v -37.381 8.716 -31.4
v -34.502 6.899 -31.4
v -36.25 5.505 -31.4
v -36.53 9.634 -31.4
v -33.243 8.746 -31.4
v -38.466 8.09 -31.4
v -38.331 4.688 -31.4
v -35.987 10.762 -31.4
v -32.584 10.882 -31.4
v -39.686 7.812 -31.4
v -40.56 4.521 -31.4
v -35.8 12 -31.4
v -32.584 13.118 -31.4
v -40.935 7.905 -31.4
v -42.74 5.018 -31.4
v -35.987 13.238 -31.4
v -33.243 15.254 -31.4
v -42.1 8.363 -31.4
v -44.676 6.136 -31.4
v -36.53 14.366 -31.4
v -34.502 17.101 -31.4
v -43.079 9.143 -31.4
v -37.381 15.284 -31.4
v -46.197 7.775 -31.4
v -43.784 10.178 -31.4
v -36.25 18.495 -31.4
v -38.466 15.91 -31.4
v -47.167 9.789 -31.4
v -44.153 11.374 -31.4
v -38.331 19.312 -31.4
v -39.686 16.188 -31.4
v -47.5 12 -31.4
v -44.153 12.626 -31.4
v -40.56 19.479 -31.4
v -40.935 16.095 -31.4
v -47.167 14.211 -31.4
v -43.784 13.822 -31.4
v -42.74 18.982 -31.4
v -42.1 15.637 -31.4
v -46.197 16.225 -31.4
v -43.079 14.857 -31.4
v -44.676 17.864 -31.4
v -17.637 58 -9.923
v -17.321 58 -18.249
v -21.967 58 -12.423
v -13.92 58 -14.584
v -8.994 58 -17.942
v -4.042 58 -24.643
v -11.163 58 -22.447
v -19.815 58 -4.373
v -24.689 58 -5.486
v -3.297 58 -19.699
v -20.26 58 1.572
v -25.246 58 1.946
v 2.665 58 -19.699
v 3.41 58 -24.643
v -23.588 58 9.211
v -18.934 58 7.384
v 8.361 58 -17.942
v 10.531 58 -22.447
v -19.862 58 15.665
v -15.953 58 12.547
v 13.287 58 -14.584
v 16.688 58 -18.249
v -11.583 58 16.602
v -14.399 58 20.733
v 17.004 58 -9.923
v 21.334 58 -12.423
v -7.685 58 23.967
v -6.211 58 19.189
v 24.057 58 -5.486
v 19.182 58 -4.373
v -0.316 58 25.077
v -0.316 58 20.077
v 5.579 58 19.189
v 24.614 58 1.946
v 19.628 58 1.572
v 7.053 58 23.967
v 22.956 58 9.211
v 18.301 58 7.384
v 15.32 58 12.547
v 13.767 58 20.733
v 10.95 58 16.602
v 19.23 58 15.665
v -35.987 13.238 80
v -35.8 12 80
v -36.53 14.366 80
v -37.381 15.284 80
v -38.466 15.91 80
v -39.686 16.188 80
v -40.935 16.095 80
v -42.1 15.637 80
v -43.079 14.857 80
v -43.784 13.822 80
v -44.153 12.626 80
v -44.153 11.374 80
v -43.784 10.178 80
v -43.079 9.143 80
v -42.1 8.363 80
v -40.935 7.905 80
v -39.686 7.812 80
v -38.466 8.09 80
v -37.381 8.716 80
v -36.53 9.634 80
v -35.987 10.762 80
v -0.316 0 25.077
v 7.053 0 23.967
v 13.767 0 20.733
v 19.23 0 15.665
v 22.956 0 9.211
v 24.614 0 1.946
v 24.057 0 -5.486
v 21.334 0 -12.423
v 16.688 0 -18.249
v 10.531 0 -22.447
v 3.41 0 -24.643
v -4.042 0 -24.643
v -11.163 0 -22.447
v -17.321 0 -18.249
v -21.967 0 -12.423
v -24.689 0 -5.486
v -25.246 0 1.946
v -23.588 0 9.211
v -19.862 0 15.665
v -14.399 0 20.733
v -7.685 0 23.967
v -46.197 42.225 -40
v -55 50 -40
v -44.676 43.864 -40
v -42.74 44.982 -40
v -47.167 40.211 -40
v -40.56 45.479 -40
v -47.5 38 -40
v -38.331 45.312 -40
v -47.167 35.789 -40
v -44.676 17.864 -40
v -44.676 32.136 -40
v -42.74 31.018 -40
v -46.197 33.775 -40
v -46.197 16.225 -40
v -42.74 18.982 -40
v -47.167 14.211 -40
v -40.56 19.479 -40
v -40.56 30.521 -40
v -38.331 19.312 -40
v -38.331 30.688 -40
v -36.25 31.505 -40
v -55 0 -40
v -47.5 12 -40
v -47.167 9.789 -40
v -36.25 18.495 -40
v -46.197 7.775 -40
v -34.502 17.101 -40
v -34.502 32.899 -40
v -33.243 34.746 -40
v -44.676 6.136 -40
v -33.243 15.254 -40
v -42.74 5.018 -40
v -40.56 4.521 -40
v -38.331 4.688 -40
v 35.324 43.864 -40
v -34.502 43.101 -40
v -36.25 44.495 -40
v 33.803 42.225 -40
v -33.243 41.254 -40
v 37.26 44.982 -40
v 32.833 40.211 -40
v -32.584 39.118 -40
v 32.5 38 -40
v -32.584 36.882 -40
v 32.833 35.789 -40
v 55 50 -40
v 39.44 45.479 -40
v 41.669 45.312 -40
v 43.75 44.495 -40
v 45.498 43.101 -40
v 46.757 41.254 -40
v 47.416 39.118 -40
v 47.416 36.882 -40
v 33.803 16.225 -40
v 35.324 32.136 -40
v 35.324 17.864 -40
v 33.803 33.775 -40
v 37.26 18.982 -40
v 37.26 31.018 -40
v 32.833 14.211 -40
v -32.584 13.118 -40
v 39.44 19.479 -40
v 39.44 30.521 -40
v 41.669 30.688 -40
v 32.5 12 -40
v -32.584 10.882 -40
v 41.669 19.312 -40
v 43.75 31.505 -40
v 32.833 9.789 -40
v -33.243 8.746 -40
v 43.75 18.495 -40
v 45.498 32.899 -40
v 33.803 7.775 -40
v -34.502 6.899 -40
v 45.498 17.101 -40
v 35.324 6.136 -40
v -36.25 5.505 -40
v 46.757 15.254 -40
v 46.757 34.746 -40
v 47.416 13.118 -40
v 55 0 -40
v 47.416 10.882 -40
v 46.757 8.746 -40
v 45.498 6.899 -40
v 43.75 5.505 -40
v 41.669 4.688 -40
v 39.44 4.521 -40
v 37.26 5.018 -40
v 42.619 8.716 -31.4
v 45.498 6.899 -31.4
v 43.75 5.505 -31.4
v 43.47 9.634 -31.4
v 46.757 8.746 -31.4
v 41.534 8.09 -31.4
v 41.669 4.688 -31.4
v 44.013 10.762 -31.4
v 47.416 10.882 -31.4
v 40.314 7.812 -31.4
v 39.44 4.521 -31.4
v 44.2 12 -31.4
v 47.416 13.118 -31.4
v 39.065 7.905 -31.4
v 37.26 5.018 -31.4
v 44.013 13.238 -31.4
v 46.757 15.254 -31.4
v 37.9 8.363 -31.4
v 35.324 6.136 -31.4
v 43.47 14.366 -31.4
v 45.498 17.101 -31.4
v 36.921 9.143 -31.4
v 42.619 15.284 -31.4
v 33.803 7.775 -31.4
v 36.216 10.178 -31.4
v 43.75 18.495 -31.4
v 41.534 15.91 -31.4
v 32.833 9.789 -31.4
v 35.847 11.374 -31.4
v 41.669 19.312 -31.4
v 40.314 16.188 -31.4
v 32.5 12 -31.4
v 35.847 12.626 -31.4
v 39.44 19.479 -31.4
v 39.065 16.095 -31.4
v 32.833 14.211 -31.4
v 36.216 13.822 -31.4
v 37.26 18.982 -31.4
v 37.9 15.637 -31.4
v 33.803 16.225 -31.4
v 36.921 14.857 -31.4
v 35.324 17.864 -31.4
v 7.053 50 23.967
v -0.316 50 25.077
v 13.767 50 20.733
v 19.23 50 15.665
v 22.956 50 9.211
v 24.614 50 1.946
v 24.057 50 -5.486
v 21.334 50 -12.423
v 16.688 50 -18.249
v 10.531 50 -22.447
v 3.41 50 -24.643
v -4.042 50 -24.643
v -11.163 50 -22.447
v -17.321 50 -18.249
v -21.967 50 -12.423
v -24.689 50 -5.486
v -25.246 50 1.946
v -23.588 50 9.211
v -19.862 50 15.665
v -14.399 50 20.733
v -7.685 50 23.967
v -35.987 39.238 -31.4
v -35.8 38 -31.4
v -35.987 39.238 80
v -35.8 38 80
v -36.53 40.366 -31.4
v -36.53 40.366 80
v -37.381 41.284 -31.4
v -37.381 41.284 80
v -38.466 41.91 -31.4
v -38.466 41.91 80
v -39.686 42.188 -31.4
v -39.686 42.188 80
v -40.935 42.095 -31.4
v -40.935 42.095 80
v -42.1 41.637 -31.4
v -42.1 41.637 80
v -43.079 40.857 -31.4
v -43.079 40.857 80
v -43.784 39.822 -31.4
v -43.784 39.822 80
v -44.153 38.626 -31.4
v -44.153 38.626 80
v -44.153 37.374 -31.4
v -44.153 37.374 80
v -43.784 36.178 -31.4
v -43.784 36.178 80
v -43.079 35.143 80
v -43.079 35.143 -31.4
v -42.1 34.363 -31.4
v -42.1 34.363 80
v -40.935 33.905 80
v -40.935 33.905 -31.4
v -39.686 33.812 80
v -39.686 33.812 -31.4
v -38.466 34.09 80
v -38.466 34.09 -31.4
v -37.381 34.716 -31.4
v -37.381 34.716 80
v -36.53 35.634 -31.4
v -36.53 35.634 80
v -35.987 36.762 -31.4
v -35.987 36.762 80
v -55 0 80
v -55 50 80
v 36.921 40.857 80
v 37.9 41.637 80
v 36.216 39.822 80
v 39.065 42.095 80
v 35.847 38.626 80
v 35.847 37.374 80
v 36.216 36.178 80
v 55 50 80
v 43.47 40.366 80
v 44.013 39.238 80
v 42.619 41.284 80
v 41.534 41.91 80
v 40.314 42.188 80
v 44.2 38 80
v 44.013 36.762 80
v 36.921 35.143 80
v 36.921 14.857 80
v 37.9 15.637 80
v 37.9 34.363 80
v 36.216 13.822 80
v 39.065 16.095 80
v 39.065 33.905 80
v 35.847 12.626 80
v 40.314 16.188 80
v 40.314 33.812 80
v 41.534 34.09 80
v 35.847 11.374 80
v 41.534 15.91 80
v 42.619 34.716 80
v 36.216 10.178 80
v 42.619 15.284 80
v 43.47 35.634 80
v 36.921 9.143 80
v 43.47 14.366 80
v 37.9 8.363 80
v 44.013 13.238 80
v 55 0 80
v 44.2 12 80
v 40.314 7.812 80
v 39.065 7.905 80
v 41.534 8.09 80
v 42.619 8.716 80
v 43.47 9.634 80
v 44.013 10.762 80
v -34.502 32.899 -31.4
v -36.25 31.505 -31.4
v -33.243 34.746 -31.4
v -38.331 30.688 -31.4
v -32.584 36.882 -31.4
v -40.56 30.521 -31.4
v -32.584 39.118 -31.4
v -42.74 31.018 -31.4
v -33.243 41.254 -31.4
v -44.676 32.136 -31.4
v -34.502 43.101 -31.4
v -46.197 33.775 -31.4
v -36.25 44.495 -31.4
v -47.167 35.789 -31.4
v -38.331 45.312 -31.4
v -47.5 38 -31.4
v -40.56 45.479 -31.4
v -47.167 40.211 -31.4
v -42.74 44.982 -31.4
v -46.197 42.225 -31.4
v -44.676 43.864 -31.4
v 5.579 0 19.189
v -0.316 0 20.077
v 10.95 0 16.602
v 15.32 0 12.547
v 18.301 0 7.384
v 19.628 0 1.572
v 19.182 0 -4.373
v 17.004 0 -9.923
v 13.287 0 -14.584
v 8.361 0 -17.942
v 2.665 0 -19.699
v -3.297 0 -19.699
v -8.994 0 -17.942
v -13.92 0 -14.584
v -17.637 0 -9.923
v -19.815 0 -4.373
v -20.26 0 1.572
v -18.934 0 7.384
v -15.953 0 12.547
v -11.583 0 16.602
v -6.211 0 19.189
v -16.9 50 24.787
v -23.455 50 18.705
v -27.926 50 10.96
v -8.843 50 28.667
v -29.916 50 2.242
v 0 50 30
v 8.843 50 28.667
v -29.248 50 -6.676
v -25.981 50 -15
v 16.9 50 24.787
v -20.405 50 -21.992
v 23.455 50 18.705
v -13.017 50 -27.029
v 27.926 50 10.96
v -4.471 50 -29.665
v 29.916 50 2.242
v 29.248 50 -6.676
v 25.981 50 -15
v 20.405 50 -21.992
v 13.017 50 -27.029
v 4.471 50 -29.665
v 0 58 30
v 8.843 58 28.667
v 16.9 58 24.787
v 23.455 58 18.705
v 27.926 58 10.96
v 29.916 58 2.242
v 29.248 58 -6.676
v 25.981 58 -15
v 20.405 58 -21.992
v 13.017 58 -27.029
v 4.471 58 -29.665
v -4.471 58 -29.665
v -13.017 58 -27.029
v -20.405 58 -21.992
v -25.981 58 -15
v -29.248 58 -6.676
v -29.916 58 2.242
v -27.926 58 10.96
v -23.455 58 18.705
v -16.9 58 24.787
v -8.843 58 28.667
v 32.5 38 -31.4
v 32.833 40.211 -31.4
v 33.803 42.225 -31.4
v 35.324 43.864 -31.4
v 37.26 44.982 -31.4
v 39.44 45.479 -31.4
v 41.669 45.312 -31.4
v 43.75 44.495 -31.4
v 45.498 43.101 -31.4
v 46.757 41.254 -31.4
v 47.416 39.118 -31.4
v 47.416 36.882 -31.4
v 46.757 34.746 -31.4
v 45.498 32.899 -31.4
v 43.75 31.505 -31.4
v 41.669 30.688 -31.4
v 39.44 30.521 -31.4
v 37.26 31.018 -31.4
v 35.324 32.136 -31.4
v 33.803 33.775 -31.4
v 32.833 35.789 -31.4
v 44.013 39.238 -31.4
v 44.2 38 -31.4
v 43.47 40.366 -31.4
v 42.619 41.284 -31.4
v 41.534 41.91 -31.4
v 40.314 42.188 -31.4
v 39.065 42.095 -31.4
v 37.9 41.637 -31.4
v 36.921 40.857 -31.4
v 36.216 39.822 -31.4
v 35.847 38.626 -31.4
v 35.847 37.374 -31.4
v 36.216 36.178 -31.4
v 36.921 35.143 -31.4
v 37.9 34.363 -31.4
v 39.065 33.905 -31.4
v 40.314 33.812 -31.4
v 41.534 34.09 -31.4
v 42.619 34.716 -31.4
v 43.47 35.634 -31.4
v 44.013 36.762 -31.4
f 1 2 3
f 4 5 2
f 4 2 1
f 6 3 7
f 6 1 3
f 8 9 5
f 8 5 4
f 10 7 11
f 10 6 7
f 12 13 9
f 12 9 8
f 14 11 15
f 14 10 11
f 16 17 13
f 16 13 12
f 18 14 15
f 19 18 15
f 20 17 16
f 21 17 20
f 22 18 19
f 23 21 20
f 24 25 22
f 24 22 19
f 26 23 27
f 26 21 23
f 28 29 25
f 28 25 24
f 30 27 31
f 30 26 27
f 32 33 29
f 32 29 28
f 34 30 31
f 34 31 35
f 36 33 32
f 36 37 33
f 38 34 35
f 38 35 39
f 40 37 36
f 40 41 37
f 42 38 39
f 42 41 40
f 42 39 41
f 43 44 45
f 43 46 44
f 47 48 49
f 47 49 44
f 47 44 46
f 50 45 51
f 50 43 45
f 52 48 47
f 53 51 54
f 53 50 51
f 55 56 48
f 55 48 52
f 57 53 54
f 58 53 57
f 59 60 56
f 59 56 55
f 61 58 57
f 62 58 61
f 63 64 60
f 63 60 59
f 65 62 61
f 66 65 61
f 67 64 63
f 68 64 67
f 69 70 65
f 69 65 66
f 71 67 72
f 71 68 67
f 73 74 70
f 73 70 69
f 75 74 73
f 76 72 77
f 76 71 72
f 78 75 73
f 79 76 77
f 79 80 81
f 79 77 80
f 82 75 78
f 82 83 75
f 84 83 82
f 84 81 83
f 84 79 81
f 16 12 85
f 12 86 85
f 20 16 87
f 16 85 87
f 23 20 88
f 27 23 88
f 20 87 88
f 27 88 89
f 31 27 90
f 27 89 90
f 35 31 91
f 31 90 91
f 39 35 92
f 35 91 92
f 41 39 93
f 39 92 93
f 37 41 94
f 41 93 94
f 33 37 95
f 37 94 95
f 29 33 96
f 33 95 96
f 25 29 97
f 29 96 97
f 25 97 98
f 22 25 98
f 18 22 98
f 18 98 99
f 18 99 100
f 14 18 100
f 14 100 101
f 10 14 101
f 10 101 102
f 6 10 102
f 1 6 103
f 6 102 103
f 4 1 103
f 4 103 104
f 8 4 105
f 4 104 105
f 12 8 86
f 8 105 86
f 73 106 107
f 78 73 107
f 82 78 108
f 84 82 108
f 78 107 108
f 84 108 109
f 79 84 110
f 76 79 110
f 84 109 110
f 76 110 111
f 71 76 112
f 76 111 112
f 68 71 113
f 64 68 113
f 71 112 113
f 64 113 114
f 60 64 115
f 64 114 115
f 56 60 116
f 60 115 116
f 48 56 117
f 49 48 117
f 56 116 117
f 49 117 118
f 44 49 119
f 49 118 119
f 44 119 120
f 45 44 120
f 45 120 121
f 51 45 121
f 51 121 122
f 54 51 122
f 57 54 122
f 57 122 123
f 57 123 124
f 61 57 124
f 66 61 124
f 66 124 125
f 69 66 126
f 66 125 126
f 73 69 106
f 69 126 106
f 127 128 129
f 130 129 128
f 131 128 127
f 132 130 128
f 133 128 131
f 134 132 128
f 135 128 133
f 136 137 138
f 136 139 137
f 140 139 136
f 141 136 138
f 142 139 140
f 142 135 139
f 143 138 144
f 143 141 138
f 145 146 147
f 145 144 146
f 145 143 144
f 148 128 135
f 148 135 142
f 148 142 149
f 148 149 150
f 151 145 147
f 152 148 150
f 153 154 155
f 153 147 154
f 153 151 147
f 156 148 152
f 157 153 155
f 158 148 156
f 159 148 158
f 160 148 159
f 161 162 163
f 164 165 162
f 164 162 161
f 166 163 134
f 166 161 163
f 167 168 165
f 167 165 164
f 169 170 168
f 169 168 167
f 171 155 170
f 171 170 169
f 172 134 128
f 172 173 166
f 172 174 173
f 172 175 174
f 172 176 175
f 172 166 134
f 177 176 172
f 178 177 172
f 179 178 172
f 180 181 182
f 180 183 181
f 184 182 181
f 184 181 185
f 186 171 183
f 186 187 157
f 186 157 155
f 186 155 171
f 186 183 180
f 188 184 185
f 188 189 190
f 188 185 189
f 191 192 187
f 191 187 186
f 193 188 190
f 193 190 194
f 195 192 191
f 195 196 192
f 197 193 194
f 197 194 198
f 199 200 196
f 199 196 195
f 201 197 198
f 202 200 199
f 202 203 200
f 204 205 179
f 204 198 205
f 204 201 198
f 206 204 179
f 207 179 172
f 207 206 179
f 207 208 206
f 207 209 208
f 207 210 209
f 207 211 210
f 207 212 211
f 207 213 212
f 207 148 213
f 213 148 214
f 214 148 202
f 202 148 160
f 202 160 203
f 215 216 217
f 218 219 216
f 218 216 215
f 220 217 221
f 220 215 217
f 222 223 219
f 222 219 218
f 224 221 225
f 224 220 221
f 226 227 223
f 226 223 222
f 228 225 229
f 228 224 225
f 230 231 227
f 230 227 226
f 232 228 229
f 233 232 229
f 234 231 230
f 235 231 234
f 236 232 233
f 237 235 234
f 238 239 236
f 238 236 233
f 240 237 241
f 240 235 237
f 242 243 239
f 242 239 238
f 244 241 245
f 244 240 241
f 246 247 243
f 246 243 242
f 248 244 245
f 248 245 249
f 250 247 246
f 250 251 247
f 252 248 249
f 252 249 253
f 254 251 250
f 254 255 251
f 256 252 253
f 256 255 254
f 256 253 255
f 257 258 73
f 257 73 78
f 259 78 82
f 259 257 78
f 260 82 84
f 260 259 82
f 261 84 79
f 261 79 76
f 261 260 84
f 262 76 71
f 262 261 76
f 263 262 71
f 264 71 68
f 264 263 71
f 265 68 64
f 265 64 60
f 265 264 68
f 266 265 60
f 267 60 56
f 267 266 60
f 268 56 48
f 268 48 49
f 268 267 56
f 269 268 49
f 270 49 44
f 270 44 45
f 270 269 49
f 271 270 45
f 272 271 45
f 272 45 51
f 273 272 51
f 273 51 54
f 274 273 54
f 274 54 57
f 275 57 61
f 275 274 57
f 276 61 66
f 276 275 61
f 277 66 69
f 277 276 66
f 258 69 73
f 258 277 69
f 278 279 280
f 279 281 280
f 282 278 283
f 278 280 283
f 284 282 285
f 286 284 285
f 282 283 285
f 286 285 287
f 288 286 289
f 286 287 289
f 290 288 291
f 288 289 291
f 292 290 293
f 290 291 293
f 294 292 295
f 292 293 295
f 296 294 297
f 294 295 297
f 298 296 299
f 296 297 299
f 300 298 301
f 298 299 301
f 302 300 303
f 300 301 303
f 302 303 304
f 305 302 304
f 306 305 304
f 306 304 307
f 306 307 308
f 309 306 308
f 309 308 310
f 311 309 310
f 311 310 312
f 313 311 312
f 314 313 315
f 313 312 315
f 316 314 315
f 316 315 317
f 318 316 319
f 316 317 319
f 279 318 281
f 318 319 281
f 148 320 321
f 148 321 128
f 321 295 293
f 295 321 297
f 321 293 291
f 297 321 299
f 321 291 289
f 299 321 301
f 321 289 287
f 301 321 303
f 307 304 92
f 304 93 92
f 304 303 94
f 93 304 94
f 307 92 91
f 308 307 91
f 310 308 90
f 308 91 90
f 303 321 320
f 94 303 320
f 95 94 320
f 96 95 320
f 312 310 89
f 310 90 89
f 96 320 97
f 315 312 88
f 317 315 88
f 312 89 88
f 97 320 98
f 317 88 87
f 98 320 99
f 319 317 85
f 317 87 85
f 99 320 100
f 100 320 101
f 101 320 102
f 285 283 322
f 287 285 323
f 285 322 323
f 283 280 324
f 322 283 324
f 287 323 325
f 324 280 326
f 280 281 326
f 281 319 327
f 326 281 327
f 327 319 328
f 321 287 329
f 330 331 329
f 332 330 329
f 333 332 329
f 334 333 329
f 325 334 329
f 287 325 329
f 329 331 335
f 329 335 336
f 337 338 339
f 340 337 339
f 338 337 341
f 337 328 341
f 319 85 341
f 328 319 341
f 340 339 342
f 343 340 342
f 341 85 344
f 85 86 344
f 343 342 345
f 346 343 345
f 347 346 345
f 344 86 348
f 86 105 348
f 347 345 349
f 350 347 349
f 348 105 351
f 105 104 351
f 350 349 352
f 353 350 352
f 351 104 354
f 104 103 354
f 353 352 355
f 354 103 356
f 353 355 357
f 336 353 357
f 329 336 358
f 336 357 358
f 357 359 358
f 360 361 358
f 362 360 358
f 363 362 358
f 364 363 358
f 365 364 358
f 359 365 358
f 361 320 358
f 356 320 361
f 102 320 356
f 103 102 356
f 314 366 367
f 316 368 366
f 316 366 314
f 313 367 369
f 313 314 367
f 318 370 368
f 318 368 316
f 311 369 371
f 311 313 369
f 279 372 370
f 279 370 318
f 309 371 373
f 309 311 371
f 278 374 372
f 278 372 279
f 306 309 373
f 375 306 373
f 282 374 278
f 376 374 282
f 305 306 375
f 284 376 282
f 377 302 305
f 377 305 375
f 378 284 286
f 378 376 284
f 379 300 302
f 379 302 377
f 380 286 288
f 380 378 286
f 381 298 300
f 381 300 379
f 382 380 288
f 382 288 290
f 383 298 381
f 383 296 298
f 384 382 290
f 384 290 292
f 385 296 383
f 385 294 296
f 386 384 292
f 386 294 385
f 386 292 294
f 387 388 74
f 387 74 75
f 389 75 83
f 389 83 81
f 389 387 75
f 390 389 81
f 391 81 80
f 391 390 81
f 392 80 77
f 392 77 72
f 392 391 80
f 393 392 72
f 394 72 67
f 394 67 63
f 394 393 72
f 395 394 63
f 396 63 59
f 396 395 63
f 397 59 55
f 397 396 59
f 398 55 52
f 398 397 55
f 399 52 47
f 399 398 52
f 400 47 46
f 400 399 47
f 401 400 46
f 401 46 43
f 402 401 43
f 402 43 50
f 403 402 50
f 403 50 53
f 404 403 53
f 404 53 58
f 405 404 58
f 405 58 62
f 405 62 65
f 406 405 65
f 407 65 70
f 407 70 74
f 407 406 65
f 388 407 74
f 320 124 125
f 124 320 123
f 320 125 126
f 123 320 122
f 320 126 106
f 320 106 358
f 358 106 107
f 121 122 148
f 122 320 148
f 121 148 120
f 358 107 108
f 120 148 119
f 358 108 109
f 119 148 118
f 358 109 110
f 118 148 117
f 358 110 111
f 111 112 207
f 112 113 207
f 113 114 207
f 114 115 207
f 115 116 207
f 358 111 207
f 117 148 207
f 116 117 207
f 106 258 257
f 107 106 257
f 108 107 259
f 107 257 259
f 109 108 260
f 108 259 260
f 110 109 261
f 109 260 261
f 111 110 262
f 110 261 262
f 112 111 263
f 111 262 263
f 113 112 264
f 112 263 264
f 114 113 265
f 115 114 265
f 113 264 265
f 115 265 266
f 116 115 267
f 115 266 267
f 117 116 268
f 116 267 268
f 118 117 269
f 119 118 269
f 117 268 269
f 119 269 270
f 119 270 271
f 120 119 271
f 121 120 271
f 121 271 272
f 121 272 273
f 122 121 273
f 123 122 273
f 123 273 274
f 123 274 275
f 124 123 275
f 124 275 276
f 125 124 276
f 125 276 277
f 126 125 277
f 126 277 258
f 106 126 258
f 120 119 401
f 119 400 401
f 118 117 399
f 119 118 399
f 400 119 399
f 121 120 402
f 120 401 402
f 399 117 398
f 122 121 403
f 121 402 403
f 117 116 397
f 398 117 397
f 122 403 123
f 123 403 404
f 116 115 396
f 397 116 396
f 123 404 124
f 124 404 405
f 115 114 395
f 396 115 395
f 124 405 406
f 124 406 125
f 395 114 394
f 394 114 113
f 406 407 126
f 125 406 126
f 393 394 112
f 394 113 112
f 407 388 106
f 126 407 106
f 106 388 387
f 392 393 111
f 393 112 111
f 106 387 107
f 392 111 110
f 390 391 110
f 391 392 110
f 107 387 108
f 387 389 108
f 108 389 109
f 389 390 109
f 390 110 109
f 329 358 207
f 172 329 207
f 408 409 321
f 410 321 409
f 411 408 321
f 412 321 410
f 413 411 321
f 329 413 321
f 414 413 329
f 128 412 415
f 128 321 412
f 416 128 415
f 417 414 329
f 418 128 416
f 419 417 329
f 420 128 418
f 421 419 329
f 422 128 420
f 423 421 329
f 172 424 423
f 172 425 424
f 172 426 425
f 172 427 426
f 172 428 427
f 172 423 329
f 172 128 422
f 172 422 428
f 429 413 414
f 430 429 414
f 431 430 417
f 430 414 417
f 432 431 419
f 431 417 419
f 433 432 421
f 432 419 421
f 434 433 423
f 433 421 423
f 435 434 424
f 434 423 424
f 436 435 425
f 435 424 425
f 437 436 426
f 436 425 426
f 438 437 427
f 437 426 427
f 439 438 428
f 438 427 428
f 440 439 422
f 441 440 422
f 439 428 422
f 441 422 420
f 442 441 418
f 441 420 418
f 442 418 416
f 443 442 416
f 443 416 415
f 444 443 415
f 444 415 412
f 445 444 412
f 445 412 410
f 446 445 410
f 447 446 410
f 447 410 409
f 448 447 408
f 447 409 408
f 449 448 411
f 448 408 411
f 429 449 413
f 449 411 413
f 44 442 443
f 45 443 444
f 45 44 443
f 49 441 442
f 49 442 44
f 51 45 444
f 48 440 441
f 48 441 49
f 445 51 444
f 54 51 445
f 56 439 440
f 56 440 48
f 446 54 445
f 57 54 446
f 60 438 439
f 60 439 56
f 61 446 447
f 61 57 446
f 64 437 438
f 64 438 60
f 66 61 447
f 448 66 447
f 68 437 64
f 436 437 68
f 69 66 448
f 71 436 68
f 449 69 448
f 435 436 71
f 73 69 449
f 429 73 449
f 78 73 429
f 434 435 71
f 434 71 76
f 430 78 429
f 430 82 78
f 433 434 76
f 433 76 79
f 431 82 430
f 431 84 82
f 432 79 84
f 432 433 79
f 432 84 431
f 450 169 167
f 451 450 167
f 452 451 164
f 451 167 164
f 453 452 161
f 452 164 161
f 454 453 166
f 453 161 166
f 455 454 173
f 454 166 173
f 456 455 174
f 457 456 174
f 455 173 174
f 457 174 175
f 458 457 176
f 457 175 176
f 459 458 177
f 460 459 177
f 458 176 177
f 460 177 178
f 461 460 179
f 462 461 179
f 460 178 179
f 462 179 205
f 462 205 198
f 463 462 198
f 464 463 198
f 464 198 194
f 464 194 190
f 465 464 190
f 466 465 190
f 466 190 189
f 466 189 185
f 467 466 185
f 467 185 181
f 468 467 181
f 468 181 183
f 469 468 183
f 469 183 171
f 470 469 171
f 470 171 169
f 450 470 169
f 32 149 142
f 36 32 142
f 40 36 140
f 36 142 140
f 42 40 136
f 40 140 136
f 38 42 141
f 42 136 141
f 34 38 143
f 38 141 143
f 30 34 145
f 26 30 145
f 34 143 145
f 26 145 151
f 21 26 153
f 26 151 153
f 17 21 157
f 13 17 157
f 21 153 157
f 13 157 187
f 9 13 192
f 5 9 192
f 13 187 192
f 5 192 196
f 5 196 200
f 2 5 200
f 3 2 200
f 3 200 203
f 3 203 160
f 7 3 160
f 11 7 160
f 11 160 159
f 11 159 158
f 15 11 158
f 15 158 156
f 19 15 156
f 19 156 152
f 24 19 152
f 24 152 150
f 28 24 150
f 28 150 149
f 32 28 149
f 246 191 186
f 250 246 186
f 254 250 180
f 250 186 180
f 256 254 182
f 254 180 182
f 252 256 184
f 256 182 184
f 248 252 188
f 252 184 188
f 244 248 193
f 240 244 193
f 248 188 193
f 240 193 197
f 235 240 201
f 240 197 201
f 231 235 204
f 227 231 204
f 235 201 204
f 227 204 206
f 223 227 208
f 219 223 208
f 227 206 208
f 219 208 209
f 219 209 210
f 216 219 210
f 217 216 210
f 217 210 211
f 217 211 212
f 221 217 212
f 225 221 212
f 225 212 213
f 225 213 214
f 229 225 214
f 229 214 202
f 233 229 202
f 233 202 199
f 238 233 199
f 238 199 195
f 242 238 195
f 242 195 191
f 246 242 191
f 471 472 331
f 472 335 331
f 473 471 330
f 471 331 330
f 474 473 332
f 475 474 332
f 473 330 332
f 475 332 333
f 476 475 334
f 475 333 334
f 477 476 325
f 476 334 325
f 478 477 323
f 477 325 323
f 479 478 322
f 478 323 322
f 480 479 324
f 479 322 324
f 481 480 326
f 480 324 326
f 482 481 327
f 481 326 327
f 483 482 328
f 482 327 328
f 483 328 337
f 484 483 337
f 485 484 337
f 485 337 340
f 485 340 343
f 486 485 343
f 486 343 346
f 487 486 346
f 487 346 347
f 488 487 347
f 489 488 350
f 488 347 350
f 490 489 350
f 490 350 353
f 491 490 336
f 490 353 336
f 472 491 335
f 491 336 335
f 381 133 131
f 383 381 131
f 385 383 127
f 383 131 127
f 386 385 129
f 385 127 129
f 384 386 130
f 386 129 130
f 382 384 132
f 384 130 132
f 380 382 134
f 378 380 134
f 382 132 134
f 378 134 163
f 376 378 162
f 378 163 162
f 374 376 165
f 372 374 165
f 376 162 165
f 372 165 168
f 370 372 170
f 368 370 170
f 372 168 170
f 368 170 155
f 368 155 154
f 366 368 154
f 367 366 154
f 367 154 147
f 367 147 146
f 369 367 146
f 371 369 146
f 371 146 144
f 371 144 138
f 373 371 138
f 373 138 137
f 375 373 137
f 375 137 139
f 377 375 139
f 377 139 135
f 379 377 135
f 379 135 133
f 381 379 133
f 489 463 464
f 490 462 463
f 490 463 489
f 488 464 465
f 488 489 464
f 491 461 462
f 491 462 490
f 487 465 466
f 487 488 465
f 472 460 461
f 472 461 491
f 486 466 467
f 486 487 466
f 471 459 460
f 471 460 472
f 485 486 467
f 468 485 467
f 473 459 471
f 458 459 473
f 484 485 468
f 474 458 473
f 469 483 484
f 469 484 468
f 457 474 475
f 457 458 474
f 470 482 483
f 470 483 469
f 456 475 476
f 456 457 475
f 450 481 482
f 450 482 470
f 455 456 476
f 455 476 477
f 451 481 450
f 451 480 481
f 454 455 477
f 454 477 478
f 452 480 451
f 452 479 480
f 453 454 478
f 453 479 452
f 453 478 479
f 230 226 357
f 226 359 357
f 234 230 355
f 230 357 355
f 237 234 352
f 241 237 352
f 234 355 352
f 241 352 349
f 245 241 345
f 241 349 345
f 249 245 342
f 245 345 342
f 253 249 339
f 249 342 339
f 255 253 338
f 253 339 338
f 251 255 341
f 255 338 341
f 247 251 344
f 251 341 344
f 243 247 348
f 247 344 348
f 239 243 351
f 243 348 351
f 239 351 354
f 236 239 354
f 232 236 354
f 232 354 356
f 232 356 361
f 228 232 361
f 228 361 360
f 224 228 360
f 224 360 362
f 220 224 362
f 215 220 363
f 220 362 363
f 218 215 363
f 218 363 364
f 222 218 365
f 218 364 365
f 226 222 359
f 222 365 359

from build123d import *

# Parameters (mm, degrees)
SKETCH1_W                                           = 110
SKETCH1_H                                           = 120
GUIDE_BLOCK_DEPTH                                   = 50
SKETCH2_R                                           = 30
SKETCH2_R_2                                         = 25
BUSH_BOSS_DEPTH                                     = 8
SKETCH3_R                                           = 25
CUT_EXTRUDE1_DEPTH                                  = 110.201648339
CBORE_FOR_M8_HEX_SOCKET_HEAD_CAP_SCREW1_D           = 8.4
CBORE_FOR_M8_HEX_SOCKET_HEAD_CAP_SCREW1_CBORE_D     = 15
CBORE_FOR_M8_HEX_SOCKET_HEAD_CAP_SCREW1_CBORE_DEPTH = 8.6
SKETCH8_R                                           = 25
SKETCH8_R_2                                         = 20
BOSS_EXTRUDE3_DEPTH                                 = 58


with BuildPart() as part:
    # Sketch1 → GUIDE_BLOCK (new body)
    with BuildSketch(Plane(origin=(0, 0, 0), x_dir=(1, 0, 0), z_dir=(0, 1, 0))):
        with Locations((0, -20)):
            Rectangle(SKETCH1_W, SKETCH1_H)
    extrude(amount=GUIDE_BLOCK_DEPTH)

    # Sketch2 → BUSH_BOSS (add)
    with BuildSketch(Plane(origin=(0, 50, 0), x_dir=(1, 0, 0), z_dir=(0, 1, 0))):
        with Locations(Location((0, 0, 0), (0, 0, 270))):
            Circle(SKETCH2_R)
        with Locations(Location((-0.316230532, -0.07747648, 0), (0, 0, 270))):
            Circle(SKETCH2_R_2, mode=Mode.SUBTRACT)
    extrude(amount=BUSH_BOSS_DEPTH)

    # Sketch3 → Cut-Extrude1 (cut, through all)
    with BuildSketch(Plane(origin=(0, 50, 0), x_dir=(1, 0, 0), z_dir=(0, 1, 0))):
        with Locations(Location((-0.316230532, -0.07747648, 0), (0, 0, 270))):
            Circle(SKETCH3_R)
    extrude(amount=-CUT_EXTRUDE1_DEPTH, mode=Mode.SUBTRACT)

    # CBORE for M8 Hex Socket Head Cap Screw1 (through all)
    with Locations(Plane(origin=(0, 0, -40), x_dir=(-1, 0, 0), z_dir=(0, 0, -1))):
        with Locations((-40, 38), (40, 38), (-40, 12), (40, 12)):
            CounterBoreHole(CBORE_FOR_M8_HEX_SOCKET_HEAD_CAP_SCREW1_D / 2, CBORE_FOR_M8_HEX_SOCKET_HEAD_CAP_SCREW1_CBORE_D / 2, CBORE_FOR_M8_HEX_SOCKET_HEAD_CAP_SCREW1_CBORE_DEPTH)


with BuildPart() as body_2:
    # Sketch8 → Boss-Extrude3 (new body)
    with BuildSketch(Plane(origin=(0, 0, 0), x_dir=(1, 0, 0), z_dir=(0, 1, 0))):
        with Locations(Location((-0.316230532, -0.07747648, 0), (0, 0, 270))):
            Circle(SKETCH8_R)
        with Locations(Location((-0.316230532, -0.07747648, 0), (0, 0, 270))):
            Circle(SKETCH8_R_2, mode=Mode.SUBTRACT)
    extrude(amount=BOSS_EXTRUDE3_DEPTH)


solid = Compound([part.part, body_2.part])
